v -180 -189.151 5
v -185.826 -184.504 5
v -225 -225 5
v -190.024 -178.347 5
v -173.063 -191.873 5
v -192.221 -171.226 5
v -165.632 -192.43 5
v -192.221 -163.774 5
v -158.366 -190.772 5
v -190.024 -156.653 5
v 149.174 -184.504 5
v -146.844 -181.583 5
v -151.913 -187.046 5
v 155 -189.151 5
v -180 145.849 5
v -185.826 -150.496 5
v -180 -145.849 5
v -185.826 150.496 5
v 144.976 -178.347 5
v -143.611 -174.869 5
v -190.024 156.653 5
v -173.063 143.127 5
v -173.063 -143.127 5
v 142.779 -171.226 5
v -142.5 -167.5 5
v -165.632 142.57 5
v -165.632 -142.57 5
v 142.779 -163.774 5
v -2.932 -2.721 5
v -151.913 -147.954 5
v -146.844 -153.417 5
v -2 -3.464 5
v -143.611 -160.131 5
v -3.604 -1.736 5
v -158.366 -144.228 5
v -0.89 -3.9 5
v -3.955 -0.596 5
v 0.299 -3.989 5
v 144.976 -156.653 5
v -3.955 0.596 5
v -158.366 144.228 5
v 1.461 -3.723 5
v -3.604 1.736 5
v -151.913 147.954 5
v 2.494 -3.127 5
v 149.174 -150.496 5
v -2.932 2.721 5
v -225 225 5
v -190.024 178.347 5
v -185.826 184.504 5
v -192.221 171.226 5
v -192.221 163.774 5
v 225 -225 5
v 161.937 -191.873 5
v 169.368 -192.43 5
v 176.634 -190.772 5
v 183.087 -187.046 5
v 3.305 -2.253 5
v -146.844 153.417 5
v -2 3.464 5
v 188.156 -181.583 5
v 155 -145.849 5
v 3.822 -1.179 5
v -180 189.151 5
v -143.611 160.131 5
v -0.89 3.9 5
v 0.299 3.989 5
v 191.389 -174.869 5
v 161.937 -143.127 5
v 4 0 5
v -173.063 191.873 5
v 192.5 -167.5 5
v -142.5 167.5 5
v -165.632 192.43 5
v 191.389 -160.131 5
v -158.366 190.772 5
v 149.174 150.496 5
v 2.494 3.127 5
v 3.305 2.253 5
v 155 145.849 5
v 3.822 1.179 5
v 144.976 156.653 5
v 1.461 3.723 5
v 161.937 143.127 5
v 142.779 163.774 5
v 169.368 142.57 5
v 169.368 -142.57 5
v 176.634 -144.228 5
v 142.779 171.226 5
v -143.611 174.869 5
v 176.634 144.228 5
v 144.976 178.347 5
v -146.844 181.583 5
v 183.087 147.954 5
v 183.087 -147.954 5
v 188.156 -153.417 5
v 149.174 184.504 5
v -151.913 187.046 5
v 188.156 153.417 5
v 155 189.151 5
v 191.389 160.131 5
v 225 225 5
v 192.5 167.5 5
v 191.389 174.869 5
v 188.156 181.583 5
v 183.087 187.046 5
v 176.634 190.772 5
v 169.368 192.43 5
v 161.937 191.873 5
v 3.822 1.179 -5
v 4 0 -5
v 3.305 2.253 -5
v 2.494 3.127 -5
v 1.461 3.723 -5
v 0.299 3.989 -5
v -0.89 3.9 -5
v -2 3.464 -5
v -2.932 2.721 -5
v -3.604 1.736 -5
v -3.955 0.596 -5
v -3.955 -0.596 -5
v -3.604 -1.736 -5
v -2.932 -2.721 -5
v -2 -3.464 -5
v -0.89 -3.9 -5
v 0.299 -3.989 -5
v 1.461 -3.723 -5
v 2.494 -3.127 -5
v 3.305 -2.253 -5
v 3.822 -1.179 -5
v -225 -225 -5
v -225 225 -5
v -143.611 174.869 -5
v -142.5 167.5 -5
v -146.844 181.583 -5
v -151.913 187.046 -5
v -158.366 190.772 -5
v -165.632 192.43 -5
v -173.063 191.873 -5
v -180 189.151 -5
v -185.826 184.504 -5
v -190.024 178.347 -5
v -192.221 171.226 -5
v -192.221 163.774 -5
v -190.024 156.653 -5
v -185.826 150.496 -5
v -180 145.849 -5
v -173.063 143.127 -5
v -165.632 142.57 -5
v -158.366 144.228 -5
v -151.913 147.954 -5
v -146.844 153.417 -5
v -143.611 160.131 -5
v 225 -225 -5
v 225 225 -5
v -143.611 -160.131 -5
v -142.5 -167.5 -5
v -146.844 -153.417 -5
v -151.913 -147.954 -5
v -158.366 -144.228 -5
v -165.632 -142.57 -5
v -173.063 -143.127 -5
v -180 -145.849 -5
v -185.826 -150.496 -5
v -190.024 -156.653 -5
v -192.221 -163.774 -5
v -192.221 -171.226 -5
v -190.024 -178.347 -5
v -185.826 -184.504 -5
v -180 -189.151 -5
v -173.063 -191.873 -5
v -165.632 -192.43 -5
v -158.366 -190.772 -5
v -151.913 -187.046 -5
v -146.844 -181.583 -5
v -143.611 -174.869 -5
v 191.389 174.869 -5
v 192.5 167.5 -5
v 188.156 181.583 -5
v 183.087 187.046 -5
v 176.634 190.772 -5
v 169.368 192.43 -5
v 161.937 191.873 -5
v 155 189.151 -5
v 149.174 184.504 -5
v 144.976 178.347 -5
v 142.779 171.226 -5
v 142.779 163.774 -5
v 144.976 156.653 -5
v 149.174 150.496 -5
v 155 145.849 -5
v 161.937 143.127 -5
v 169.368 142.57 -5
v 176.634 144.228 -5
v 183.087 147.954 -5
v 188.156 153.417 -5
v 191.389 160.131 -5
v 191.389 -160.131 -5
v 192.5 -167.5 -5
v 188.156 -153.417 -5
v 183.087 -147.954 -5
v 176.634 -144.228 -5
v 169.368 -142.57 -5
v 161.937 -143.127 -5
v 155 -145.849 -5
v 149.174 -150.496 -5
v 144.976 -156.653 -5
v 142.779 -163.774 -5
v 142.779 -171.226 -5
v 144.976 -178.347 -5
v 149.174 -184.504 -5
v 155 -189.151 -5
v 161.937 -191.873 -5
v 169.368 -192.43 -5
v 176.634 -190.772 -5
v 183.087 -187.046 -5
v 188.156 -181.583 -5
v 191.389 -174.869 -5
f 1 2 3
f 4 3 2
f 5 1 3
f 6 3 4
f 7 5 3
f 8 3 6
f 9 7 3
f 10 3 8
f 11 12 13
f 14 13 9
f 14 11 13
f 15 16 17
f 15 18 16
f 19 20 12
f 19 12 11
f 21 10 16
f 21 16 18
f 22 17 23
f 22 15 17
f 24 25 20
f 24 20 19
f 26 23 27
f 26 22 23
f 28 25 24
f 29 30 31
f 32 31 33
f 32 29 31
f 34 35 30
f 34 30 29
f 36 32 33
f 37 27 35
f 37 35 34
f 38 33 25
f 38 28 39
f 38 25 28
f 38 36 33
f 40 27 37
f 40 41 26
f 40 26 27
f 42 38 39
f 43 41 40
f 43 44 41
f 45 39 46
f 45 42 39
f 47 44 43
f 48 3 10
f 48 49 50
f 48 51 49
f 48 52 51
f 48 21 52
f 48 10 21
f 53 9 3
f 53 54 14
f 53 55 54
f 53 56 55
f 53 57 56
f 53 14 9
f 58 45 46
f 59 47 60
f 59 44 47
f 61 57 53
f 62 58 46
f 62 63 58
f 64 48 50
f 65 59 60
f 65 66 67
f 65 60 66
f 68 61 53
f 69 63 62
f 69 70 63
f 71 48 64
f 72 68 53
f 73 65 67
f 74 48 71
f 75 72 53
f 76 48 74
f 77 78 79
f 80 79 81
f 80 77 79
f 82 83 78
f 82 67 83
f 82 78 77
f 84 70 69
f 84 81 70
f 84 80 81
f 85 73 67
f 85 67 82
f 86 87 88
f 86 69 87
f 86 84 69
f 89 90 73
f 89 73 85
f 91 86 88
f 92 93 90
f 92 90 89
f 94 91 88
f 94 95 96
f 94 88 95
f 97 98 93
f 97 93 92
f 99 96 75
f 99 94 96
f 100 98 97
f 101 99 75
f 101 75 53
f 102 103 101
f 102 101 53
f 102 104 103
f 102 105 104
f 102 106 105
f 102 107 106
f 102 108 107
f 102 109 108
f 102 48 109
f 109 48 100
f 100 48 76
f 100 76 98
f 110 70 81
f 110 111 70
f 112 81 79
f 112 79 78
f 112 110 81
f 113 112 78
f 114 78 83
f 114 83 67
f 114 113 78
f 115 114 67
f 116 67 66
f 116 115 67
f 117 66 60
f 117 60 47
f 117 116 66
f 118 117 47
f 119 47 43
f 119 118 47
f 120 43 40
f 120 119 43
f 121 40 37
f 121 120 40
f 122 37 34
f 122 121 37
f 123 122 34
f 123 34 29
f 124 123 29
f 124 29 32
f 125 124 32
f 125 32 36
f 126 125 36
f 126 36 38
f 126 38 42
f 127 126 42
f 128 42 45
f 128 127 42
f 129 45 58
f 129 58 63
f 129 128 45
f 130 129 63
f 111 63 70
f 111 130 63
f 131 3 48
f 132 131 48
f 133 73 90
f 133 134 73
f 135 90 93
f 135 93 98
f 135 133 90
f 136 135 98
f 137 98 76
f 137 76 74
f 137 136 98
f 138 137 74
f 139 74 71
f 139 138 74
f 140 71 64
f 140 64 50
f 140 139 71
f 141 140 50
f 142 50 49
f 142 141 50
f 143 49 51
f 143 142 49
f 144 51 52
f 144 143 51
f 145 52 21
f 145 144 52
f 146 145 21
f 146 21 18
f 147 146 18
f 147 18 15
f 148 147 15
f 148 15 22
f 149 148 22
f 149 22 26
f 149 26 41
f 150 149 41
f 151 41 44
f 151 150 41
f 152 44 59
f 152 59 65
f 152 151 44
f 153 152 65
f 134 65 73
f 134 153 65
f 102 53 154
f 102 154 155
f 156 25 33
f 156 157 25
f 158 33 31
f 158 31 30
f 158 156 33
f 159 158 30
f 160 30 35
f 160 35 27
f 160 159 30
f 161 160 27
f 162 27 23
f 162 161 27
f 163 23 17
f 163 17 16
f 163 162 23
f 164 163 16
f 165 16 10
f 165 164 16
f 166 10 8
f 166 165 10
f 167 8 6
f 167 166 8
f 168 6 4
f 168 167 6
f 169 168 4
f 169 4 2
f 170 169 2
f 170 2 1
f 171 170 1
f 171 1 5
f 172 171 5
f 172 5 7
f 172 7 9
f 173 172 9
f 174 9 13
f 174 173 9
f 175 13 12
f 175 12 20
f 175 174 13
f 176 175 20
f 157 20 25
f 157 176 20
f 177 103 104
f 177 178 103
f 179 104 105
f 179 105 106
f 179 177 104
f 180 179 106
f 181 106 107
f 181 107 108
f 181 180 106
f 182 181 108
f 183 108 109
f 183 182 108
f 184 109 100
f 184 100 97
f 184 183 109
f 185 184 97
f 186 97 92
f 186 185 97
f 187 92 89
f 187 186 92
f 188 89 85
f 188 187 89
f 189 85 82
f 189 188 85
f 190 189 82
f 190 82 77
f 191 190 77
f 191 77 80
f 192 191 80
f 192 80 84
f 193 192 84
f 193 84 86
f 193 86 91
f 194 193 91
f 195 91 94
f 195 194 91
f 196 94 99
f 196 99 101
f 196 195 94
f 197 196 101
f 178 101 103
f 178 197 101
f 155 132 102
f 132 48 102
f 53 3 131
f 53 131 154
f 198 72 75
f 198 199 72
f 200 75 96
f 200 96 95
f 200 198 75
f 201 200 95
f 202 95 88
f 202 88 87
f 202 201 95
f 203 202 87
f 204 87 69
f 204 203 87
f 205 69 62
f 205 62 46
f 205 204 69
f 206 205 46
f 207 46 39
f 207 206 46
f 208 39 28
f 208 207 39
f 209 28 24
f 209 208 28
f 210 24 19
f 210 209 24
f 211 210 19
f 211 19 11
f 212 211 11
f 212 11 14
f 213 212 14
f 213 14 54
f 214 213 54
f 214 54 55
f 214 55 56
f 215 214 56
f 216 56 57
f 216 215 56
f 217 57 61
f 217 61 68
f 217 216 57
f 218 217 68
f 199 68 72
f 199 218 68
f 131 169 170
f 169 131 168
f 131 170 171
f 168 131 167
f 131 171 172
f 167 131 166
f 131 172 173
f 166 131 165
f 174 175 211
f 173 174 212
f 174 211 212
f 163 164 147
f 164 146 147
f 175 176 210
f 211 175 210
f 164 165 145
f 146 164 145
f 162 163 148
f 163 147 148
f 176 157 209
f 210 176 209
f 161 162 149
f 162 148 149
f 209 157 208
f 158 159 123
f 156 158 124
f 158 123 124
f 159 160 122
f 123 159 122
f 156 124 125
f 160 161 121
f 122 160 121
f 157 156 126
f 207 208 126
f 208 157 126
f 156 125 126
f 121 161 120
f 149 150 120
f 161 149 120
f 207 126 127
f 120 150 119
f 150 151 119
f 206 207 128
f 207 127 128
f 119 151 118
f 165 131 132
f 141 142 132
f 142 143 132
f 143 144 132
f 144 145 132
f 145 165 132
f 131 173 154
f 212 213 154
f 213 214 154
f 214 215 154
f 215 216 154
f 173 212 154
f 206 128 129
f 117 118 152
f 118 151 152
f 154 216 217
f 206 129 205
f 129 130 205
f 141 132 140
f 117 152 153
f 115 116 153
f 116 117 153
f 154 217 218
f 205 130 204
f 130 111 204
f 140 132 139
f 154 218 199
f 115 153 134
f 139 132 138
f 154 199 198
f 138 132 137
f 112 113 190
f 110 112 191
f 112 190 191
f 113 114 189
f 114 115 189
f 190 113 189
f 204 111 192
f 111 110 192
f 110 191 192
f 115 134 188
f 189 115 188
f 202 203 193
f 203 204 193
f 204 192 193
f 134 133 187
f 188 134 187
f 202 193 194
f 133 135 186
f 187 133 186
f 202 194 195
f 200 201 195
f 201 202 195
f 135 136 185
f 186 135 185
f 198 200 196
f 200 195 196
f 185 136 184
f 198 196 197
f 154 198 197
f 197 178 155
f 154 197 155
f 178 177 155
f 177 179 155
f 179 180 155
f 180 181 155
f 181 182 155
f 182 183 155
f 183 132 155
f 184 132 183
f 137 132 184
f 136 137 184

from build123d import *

# Parameters (mm, degrees)
SKETCH1_W           = 450
SKETCH1_H           = 450
SKETCH1_R           = 4
SKETCH1_R_2         = 25
BOSS_EXTRUDE1_DEPTH = 5


with BuildPart() as part:
    # Sketch1 → Boss-Extrude1 (new, symmetric)
    with BuildSketch(Plane.XY):
        Rectangle(SKETCH1_W, SKETCH1_H)
        Circle(SKETCH1_R, mode=Mode.SUBTRACT)
        with Locations((-167.5, -167.5)):
            Circle(SKETCH1_R_2, mode=Mode.SUBTRACT)
        with Locations((167.5, -167.5)):
            Circle(SKETCH1_R_2, mode=Mode.SUBTRACT)
        with Locations((167.5, 167.5)):
            Circle(SKETCH1_R_2, mode=Mode.SUBTRACT)
        with Locations((-167.5, 167.5)):
            Circle(SKETCH1_R_2, mode=Mode.SUBTRACT)
    extrude(amount=BOSS_EXTRUDE1_DEPTH, both=True)


solid = part.part
